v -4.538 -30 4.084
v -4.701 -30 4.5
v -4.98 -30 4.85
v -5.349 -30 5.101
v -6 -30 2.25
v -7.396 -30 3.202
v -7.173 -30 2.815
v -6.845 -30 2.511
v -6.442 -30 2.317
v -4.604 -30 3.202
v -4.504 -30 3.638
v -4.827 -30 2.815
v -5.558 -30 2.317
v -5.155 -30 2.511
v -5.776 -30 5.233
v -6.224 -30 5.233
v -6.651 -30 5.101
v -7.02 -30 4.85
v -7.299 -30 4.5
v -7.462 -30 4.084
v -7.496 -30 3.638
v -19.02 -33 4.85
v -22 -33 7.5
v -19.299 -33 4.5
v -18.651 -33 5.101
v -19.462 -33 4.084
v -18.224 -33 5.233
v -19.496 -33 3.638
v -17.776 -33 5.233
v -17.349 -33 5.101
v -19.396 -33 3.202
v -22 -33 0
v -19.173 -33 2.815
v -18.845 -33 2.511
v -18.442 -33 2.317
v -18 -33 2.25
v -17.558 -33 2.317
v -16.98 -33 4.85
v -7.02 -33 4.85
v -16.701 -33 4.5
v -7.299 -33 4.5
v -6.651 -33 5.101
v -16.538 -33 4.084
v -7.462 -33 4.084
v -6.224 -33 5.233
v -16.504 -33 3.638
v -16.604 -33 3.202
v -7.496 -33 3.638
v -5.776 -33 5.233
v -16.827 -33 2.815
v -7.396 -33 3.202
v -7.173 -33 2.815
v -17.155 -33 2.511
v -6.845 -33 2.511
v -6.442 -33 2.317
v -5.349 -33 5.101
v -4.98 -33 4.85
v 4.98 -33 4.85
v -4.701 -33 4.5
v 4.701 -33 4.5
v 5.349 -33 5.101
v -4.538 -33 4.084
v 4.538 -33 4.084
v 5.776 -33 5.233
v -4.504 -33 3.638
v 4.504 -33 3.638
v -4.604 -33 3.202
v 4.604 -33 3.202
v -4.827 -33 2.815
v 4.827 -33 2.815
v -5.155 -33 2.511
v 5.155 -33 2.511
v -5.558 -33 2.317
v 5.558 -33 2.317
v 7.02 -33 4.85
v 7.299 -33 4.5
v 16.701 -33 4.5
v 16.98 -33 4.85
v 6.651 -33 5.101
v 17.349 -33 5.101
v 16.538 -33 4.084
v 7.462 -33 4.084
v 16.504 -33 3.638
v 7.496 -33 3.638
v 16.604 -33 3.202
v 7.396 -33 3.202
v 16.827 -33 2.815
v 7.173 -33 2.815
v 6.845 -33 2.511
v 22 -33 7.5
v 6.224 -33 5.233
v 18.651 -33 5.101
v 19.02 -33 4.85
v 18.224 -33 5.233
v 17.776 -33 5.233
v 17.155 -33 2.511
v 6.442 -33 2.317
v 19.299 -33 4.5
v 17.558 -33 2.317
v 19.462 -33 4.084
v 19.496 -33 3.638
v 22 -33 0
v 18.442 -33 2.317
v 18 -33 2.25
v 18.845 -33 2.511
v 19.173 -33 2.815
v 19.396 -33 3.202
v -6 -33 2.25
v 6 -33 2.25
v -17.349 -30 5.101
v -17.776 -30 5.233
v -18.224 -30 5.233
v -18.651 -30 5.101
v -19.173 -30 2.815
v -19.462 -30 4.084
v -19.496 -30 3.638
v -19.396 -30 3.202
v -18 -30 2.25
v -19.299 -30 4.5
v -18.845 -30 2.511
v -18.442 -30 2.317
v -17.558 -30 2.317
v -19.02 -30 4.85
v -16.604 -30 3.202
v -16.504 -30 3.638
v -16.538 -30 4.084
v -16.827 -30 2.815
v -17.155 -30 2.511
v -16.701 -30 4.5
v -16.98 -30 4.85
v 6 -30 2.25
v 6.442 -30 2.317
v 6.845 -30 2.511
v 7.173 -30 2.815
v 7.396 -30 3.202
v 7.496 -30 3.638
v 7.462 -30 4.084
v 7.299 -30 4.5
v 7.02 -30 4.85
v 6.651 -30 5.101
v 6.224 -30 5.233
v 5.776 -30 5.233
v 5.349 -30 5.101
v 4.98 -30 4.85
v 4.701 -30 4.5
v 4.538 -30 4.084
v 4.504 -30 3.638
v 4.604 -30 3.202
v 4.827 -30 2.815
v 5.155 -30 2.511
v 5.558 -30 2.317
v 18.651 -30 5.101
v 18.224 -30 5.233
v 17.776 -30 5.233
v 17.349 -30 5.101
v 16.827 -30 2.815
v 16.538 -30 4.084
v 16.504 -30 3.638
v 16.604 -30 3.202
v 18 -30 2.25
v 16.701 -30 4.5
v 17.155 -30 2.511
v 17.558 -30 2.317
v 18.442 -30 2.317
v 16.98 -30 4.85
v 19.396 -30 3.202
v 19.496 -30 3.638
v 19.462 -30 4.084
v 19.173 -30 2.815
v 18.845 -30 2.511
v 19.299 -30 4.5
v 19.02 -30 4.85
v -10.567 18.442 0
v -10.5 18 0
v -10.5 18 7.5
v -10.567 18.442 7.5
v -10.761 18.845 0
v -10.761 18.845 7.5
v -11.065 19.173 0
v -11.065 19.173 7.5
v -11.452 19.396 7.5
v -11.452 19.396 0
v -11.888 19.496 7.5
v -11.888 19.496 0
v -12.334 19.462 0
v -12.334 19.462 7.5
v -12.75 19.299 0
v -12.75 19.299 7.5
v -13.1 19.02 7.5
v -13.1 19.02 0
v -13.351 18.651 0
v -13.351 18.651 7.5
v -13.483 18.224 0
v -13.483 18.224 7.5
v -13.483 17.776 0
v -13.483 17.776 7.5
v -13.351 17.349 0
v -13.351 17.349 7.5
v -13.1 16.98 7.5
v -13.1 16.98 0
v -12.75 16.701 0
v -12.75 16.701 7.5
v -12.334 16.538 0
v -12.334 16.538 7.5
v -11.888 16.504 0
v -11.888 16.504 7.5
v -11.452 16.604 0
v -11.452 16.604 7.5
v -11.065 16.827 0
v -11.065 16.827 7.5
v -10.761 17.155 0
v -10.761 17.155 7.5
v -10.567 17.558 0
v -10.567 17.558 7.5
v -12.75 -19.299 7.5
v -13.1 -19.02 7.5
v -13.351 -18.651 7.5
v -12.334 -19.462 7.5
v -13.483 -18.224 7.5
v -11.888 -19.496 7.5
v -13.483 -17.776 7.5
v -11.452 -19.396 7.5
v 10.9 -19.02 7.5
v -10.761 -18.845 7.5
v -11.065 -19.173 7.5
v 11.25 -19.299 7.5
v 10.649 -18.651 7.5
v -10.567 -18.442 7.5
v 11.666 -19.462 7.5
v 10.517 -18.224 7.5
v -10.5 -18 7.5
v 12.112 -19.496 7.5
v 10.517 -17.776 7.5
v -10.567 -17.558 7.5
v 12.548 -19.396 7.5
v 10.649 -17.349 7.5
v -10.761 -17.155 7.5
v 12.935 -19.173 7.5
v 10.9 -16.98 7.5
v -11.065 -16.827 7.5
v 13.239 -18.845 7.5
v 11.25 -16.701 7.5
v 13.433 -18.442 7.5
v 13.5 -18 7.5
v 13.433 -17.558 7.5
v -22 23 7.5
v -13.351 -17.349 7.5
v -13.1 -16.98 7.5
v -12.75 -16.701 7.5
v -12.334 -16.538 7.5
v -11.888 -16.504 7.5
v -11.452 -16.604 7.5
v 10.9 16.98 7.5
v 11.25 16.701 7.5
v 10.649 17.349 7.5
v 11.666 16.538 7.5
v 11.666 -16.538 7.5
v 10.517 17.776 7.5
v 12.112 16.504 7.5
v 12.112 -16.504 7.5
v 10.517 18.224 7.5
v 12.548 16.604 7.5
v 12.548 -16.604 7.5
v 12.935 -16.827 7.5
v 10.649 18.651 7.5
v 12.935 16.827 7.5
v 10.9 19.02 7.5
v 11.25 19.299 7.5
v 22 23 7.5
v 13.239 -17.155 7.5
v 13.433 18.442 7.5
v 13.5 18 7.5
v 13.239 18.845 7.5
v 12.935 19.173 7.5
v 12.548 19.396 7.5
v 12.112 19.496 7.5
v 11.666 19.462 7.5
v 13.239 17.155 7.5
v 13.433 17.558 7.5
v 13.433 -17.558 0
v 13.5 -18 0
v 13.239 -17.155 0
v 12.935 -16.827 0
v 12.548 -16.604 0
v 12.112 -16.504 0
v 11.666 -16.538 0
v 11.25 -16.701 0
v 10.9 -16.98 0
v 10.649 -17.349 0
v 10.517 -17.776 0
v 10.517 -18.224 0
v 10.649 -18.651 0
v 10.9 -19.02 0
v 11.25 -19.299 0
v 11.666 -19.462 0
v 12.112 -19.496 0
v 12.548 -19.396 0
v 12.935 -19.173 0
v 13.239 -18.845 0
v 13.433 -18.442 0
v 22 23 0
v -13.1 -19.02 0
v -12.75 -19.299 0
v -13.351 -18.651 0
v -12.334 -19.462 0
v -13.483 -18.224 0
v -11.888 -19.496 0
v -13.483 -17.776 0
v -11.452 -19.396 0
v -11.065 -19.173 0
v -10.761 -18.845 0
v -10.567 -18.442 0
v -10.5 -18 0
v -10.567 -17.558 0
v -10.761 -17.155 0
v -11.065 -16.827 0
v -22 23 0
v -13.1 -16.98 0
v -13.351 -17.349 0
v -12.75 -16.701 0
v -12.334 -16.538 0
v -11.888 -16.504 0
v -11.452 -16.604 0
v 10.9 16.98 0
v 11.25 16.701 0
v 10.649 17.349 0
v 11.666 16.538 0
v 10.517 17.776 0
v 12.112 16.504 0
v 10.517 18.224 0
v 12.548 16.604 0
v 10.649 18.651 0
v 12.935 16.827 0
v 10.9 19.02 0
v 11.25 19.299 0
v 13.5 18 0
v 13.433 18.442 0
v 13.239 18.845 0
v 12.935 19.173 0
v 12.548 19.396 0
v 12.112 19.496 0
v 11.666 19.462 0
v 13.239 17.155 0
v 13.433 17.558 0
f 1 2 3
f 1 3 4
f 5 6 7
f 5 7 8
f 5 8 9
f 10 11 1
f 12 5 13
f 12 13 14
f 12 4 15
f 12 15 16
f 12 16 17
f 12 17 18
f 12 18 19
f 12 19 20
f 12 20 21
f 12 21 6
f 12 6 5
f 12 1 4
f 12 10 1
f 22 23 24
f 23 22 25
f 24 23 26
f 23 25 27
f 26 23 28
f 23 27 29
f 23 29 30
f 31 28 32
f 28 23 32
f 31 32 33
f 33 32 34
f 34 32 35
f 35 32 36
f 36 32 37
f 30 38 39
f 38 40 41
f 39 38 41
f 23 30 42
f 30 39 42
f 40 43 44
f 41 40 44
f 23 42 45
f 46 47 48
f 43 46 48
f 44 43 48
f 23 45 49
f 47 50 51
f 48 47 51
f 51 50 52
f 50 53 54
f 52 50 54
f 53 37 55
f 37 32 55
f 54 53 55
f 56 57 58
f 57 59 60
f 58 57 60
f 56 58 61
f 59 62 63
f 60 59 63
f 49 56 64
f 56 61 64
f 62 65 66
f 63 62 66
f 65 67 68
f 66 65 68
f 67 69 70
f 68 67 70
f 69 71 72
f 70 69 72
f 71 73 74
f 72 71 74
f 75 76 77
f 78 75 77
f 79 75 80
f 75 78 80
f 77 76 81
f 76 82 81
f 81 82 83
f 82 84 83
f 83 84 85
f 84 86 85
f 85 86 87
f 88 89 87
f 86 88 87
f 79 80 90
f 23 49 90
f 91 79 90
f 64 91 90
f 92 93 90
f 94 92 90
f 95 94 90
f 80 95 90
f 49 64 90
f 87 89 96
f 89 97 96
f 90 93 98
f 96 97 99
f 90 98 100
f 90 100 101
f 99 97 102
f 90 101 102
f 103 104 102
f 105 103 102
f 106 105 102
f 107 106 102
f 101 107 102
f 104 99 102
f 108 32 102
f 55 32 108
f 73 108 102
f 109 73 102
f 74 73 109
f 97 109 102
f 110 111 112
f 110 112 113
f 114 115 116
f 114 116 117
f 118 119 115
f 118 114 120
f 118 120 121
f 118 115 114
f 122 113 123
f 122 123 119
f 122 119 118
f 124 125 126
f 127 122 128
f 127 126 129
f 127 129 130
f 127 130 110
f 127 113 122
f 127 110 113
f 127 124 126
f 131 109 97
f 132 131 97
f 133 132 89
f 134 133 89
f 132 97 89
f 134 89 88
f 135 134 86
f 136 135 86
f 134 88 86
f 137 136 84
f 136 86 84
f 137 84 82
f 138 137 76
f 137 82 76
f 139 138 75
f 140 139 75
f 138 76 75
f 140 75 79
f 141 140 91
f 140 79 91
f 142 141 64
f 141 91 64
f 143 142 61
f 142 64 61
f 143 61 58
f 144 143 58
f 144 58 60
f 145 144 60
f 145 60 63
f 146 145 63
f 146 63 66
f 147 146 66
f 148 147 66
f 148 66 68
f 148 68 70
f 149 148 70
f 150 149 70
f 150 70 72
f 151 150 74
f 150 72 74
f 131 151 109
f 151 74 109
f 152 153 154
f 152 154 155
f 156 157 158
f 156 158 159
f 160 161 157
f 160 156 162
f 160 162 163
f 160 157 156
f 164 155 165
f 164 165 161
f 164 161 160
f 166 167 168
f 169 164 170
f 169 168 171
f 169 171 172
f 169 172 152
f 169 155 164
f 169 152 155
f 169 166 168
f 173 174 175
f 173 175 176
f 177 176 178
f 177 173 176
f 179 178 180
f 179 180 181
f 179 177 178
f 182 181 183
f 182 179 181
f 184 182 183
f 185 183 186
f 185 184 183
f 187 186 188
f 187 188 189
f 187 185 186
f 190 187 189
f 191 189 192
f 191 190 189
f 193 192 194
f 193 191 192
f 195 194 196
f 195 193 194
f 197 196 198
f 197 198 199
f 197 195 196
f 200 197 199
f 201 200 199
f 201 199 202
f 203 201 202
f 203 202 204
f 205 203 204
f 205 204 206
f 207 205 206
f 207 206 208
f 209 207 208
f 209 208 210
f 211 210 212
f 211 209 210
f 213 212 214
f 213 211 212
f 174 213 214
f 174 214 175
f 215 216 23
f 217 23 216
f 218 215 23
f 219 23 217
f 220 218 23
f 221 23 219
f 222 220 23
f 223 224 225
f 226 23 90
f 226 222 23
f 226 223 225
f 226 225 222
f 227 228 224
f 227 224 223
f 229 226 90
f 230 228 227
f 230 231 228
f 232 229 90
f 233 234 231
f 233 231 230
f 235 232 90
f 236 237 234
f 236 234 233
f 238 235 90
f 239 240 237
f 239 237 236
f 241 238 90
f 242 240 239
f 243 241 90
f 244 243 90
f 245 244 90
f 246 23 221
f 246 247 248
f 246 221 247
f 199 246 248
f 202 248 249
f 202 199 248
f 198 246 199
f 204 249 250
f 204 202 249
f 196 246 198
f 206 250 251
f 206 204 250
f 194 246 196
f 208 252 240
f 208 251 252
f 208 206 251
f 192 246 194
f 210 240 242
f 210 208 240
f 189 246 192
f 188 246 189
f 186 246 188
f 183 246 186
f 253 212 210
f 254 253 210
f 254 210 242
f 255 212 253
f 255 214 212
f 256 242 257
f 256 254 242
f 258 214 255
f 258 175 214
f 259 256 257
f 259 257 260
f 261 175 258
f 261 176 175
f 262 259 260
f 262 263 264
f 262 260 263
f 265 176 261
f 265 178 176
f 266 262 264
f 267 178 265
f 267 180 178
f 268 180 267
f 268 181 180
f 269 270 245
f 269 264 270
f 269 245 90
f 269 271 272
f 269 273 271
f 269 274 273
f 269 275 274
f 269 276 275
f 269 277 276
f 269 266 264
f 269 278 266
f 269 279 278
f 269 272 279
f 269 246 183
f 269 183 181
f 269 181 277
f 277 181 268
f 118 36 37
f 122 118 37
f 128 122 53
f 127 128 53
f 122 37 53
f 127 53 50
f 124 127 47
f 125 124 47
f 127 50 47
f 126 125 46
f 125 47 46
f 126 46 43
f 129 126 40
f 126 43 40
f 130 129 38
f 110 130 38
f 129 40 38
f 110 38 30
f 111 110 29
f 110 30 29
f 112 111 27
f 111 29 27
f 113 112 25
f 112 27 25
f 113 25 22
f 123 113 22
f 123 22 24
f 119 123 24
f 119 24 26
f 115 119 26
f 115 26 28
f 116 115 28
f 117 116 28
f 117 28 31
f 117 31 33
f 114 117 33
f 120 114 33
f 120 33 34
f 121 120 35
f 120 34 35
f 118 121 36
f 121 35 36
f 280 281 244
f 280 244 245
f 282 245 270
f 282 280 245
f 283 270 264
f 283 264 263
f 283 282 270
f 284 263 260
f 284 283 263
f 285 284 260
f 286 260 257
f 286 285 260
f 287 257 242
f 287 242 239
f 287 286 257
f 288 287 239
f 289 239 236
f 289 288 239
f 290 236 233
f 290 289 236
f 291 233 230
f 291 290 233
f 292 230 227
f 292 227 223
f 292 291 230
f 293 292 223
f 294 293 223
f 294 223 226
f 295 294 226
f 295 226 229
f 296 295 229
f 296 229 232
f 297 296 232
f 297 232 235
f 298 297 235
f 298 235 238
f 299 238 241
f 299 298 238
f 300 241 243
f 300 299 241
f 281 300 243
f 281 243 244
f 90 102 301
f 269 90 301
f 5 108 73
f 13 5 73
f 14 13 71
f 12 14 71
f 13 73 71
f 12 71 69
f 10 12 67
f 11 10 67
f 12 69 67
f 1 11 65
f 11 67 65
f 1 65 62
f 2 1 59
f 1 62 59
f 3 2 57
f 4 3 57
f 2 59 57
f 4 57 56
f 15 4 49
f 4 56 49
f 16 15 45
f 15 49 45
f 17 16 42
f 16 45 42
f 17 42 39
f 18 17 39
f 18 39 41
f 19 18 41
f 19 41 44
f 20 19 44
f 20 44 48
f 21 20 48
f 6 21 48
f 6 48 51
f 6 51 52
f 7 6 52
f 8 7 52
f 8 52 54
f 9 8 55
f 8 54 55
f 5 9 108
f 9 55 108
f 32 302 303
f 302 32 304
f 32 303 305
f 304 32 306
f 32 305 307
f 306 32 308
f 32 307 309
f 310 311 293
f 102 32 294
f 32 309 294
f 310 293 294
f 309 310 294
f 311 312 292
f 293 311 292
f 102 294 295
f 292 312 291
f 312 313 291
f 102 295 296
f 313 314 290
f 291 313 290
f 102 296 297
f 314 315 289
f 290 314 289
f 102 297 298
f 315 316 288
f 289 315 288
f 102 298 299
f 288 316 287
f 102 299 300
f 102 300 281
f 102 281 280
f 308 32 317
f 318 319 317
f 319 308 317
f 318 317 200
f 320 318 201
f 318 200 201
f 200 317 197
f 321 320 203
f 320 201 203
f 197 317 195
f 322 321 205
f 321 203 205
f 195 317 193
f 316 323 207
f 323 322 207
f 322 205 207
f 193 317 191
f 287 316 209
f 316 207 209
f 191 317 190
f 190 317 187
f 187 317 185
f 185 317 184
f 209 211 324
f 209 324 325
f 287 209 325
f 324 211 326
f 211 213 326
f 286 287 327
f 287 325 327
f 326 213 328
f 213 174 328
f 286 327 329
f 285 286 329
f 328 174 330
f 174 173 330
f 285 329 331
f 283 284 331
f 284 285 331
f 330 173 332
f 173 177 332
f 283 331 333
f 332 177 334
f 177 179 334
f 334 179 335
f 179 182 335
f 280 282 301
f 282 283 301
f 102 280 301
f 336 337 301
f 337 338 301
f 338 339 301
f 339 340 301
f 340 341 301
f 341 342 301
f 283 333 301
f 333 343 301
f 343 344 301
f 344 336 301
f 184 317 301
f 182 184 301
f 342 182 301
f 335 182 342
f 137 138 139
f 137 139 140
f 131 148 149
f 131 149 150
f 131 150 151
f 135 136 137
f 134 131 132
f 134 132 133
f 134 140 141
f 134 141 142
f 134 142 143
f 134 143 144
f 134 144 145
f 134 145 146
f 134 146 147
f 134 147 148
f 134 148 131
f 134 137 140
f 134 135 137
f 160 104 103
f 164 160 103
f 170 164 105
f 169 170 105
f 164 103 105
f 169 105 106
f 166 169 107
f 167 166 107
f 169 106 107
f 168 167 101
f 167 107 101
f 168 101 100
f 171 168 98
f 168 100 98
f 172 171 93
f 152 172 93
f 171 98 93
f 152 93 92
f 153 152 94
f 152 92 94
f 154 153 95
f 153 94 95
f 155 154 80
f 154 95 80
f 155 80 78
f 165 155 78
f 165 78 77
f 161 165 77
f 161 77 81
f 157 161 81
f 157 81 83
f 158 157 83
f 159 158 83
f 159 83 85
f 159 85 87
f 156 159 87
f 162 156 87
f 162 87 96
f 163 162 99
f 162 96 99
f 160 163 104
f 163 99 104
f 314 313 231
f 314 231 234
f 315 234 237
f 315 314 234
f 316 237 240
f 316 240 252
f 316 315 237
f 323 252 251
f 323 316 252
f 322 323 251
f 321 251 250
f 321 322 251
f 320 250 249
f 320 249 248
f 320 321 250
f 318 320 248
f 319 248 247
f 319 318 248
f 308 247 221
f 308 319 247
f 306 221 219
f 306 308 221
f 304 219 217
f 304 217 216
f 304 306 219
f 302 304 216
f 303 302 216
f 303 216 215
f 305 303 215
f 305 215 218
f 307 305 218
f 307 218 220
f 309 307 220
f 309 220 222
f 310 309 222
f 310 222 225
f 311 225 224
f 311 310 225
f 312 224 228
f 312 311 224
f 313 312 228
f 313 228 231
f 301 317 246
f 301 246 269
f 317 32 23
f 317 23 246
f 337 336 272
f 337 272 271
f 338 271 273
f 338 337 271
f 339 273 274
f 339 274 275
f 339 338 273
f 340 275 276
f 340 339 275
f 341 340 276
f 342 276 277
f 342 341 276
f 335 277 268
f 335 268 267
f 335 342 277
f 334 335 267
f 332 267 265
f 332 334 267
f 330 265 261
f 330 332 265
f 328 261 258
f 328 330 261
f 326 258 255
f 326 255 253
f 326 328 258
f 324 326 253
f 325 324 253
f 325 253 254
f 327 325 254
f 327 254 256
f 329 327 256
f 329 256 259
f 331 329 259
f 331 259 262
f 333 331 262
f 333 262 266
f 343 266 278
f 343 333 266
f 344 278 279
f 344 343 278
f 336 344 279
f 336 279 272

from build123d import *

# Parameters (mm, degrees)
SKETCH_1_W          = 44
SKETCH_1_H          = 56
SKETCH_1_R          = 1.5
EXTRUDE_1_DEPTH     = 7.5
SKETCH_2_R          = 1.5
CUT_EXTRUDE_1_DEPTH = 3


with BuildPart() as part:
    # 草圖1 → 填料-伸長1 (new body)
    with BuildSketch(Plane.XY):
        with Locations((0, -5)):
            Rectangle(SKETCH_1_W, SKETCH_1_H)
        with Locations((-12, 18)):
            Circle(SKETCH_1_R, mode=Mode.SUBTRACT)
        with Locations((12, 18)):
            Circle(SKETCH_1_R, mode=Mode.SUBTRACT)
        with Locations((12, -18)):
            Circle(SKETCH_1_R, mode=Mode.SUBTRACT)
        with Locations((-12, -18)):
            Circle(SKETCH_1_R, mode=Mode.SUBTRACT)
    extrude(amount=EXTRUDE_1_DEPTH)

    # 草圖2 → 除料-伸長1 (cut)
    with BuildSketch(Plane(origin=(0, -33, 0), x_dir=(-1, 0, 0), z_dir=(0, -1, 0))):
        with Locations(Location((-6, -3.75, 0), (0, 0, 90))):
            Circle(SKETCH_2_R)
        with Locations(Location((-18, -3.75, 0), (0, 0, 90))):
            Circle(SKETCH_2_R)
        with Locations(Location((6, -3.75, 0), (0, 0, 90))):
            Circle(SKETCH_2_R)
        with Locations(Location((18, -3.75, 0), (0, 0, 90))):
            Circle(SKETCH_2_R)
    extrude(amount=-CUT_EXTRUDE_1_DEPTH, mode=Mode.SUBTRACT)


solid = part.part
